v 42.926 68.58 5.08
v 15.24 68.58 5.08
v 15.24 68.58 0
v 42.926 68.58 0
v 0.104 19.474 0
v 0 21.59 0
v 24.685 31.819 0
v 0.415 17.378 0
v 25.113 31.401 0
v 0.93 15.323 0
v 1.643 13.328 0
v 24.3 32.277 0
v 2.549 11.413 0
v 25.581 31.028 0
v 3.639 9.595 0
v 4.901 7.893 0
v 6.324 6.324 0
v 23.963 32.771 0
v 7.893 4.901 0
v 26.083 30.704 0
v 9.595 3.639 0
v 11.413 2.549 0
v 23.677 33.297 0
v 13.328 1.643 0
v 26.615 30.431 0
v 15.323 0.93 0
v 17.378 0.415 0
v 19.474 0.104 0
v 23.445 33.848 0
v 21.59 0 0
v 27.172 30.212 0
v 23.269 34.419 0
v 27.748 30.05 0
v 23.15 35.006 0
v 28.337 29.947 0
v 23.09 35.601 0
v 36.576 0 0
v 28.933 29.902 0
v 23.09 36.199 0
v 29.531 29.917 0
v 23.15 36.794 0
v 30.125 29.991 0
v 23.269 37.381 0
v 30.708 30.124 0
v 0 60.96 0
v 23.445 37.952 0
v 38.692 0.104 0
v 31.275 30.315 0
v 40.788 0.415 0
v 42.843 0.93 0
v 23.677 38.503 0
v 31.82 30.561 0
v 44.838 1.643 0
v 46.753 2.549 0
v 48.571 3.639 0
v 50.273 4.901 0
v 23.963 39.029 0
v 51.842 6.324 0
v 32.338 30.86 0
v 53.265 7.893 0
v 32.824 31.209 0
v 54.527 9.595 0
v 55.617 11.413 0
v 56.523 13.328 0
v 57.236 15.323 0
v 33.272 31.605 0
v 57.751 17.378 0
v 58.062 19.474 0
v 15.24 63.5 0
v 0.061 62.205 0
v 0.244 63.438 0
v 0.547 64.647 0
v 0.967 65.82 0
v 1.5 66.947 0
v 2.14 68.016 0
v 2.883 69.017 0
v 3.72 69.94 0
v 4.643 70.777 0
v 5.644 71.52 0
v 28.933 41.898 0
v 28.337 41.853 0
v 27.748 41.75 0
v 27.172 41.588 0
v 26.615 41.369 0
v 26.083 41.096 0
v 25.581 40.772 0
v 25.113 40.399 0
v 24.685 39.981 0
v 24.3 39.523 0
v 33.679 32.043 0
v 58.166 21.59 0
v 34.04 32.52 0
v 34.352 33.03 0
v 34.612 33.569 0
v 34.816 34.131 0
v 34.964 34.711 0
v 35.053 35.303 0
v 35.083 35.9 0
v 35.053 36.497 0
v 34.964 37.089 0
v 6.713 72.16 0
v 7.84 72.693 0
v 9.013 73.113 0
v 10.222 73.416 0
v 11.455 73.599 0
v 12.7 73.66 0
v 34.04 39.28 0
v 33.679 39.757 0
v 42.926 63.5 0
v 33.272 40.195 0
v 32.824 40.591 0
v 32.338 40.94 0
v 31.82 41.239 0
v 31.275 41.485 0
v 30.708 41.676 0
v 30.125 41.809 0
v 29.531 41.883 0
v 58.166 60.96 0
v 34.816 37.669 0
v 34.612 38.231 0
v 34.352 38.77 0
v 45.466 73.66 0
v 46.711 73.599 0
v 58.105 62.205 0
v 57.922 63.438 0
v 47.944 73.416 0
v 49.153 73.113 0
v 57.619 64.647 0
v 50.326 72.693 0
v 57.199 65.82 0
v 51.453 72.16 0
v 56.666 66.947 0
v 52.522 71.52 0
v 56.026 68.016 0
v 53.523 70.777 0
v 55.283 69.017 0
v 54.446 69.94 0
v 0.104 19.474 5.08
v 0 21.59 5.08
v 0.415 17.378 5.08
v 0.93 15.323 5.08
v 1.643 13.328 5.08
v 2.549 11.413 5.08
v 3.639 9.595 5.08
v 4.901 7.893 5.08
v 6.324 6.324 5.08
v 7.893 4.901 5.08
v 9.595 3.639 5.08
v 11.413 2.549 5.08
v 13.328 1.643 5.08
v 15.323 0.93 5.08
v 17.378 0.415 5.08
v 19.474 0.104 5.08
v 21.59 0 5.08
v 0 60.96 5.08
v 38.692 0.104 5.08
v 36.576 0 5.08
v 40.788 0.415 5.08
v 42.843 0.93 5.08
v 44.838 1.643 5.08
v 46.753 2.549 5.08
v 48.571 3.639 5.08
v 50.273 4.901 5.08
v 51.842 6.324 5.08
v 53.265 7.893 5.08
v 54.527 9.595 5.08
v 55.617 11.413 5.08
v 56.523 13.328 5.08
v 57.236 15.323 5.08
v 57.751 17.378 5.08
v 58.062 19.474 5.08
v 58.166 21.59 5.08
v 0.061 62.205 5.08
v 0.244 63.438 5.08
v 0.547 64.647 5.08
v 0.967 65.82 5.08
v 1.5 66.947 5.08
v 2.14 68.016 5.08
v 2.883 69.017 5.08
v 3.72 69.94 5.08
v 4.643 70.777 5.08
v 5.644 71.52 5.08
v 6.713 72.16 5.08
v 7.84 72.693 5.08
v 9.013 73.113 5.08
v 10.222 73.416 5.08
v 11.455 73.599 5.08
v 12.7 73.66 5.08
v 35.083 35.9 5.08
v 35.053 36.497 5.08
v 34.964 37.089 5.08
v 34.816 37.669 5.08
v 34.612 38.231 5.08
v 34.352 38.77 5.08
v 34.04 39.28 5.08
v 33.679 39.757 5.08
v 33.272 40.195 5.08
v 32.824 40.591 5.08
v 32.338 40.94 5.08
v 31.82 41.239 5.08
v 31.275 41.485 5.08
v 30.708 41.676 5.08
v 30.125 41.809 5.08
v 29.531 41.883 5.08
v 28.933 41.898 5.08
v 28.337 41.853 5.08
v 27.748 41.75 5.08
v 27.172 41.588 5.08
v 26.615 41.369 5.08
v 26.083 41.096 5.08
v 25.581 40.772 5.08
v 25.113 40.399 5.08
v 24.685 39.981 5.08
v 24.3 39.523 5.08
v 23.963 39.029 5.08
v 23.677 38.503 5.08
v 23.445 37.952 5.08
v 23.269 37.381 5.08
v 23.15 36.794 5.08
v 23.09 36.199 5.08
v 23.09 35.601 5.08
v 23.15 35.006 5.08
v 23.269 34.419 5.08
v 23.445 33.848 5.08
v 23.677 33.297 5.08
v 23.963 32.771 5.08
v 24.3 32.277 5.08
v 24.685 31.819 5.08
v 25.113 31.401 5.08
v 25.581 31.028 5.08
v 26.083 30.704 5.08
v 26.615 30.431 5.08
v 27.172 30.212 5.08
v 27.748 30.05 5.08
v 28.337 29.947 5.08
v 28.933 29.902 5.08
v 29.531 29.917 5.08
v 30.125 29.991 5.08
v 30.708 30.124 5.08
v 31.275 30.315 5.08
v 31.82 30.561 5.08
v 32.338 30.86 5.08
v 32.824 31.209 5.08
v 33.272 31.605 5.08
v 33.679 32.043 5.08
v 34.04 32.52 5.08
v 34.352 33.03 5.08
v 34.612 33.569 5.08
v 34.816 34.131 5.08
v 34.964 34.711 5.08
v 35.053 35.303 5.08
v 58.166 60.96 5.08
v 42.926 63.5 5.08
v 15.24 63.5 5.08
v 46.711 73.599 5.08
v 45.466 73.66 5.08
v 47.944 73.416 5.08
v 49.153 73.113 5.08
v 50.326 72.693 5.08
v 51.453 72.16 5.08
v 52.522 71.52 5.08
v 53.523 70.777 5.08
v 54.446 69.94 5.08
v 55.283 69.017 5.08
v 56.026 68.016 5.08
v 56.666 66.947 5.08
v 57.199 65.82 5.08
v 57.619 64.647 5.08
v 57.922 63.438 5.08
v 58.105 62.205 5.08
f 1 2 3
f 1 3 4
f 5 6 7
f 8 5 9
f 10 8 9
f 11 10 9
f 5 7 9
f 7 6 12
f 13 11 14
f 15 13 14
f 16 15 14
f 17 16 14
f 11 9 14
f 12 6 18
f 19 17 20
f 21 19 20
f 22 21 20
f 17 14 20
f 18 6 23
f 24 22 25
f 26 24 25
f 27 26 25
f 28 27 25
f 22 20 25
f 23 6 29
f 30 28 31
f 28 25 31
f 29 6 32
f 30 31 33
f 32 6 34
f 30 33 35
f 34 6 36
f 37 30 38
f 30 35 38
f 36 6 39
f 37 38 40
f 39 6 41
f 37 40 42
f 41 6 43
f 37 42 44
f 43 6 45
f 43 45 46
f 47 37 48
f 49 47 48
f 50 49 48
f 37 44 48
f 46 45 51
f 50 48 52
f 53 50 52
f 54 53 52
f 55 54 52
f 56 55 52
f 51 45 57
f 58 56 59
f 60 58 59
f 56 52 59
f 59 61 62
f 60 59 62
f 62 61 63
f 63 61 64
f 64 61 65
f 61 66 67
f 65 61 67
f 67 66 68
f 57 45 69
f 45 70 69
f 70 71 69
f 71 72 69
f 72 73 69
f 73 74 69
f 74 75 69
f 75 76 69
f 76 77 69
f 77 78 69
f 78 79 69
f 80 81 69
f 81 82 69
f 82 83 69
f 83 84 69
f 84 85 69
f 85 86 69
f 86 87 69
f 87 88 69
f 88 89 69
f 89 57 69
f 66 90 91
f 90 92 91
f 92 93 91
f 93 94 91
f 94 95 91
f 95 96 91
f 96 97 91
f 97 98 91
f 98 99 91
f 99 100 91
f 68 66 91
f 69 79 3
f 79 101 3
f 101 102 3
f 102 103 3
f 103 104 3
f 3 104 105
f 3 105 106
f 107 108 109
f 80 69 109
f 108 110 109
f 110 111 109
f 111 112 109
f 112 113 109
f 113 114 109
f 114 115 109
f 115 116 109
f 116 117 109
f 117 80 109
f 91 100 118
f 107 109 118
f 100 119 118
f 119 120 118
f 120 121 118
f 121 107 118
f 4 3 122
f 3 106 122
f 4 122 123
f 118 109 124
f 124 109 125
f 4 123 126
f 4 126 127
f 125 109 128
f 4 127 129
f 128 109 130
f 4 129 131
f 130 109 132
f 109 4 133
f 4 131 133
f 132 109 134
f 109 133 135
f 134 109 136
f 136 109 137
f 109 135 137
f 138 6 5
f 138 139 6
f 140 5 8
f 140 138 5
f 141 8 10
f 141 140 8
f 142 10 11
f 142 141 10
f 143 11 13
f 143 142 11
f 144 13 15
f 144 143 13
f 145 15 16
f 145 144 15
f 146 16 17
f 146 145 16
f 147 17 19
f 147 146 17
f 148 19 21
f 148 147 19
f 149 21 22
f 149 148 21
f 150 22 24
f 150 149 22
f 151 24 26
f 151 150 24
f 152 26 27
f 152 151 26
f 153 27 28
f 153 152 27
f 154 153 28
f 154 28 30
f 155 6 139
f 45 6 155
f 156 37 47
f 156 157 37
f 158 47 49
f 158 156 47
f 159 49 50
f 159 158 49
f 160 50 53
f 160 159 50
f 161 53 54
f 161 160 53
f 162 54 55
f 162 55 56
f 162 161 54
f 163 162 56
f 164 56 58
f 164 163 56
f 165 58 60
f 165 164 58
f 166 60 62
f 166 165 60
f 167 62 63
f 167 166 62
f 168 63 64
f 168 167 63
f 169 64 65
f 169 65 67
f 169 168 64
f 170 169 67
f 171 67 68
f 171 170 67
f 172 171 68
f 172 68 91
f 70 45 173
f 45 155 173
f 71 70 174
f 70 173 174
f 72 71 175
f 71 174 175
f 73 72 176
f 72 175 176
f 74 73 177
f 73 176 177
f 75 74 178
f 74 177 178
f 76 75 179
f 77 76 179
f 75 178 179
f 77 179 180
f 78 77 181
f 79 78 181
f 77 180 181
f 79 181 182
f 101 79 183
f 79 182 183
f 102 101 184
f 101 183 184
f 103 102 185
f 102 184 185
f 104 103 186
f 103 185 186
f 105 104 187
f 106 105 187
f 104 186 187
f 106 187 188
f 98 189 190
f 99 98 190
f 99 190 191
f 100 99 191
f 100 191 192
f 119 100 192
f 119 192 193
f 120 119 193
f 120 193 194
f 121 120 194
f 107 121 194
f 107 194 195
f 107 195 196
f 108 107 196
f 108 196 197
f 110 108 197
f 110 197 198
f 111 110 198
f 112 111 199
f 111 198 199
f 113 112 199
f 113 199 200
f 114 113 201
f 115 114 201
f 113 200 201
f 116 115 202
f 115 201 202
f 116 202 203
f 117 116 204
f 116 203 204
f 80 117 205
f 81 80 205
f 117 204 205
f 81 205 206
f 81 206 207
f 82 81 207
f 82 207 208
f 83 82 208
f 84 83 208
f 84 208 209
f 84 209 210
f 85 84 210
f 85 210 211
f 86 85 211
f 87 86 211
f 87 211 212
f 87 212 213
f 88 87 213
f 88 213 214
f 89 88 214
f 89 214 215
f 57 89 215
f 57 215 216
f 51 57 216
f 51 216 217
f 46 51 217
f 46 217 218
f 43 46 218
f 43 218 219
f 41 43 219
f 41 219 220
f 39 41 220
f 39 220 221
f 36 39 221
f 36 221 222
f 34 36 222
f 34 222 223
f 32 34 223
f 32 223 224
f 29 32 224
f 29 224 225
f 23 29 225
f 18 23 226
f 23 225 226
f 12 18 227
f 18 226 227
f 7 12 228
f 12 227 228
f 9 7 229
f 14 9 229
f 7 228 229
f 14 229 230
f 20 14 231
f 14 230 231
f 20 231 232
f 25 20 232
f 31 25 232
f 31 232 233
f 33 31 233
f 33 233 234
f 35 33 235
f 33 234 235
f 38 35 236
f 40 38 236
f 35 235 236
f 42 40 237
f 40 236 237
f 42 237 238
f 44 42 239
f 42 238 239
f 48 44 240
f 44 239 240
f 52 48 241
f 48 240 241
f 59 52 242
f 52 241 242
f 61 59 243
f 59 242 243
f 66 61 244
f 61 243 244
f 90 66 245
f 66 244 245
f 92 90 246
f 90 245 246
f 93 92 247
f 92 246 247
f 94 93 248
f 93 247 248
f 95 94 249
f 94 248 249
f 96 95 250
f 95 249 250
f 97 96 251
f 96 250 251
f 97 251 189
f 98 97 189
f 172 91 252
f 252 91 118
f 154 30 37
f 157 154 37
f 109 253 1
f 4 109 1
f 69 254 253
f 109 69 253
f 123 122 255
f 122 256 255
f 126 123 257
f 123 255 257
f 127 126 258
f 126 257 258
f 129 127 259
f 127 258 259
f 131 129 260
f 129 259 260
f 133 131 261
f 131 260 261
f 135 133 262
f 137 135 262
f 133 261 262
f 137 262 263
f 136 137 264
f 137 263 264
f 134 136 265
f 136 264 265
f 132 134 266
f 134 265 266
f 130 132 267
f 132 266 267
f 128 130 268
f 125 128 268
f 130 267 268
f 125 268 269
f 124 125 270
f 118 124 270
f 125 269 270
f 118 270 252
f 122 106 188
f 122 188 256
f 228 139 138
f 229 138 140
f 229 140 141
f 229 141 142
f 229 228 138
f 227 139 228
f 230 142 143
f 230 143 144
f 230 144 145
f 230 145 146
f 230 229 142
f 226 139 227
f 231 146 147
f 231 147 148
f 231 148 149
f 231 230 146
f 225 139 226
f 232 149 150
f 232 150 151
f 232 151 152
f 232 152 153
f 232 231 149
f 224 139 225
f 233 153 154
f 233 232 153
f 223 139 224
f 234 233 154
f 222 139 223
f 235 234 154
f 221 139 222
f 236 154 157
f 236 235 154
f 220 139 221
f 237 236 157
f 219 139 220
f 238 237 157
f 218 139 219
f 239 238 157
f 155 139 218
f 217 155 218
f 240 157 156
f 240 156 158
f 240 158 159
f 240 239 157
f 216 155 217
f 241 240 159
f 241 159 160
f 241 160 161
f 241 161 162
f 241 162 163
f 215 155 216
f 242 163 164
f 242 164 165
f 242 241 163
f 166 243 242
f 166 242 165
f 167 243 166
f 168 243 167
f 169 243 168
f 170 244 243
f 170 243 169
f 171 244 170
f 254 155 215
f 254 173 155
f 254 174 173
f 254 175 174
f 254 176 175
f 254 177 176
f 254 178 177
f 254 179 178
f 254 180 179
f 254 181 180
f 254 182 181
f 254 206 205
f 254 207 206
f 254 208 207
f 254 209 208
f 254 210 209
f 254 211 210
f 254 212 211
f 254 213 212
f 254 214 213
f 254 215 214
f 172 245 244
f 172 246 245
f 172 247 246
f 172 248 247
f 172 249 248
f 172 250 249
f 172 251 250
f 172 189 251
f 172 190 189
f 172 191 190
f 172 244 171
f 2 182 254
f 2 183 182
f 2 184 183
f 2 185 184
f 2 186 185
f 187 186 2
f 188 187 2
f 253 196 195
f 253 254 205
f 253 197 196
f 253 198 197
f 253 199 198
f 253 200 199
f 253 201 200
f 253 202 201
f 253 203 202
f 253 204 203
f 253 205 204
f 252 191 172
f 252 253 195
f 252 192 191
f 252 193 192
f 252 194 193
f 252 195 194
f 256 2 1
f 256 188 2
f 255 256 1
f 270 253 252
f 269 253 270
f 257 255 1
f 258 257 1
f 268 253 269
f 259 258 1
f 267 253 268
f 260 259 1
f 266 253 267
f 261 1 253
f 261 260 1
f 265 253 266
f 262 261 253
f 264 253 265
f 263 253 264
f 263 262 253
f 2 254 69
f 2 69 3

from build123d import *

# Parameters (mm, degrees)
SKETCH1_W           = 58.166
SKETCH1_H           = 73.66
BOSS_EXTRUDE1_DEPTH = 5.08
SKETCH2_W           = 27.686
SKETCH2_H           = 5.08
CUT_EXTRUDE1_DEPTH  = 94.994071919
SKETCH7_R           = 6
CUT_EXTRUDE2_DEPTH  = 94.994071919
FILLET1_R           = 21.59
FILLET2_R           = 12.7


with BuildPart() as part:
    # Sketch1 → Boss-Extrude1 (new body)
    with BuildSketch(Plane.XY):
        with Locations((29.083, 36.83)):
            Rectangle(SKETCH1_W, SKETCH1_H)
    extrude(amount=BOSS_EXTRUDE1_DEPTH)

    # Sketch2 → Cut-Extrude1 (cut, through all)
    with BuildSketch(Plane.XY.offset(5.08)):
        with Locations((29.083, 66.04)):
            Rectangle(SKETCH2_W, SKETCH2_H)
    extrude(amount=-CUT_EXTRUDE1_DEPTH, mode=Mode.SUBTRACT)

    # Sketch7 → Cut-Extrude2 (cut, through all)
    with BuildSketch(Plane.XY.offset(5.08)):
        with Locations((29.083, 35.9)):
            Circle(SKETCH7_R)
    extrude(amount=-CUT_EXTRUDE2_DEPTH, mode=Mode.SUBTRACT)

    # Fillet1
    fillet1_edges = [part.edges().sort_by_distance(p)[0] for p in [
        (58.166, 0, 2.54),
        (0, 0, 2.54),
    ]]
    fillet(fillet1_edges, radius=FILLET1_R)

    # Fillet2
    fillet2_edges = [part.edges().sort_by_distance(p)[0] for p in [
        (0, 73.66, 2.54),
        (58.166, 73.66, 2.54),
    ]]
    fillet(fillet2_edges, radius=FILLET2_R)


solid = part.part
